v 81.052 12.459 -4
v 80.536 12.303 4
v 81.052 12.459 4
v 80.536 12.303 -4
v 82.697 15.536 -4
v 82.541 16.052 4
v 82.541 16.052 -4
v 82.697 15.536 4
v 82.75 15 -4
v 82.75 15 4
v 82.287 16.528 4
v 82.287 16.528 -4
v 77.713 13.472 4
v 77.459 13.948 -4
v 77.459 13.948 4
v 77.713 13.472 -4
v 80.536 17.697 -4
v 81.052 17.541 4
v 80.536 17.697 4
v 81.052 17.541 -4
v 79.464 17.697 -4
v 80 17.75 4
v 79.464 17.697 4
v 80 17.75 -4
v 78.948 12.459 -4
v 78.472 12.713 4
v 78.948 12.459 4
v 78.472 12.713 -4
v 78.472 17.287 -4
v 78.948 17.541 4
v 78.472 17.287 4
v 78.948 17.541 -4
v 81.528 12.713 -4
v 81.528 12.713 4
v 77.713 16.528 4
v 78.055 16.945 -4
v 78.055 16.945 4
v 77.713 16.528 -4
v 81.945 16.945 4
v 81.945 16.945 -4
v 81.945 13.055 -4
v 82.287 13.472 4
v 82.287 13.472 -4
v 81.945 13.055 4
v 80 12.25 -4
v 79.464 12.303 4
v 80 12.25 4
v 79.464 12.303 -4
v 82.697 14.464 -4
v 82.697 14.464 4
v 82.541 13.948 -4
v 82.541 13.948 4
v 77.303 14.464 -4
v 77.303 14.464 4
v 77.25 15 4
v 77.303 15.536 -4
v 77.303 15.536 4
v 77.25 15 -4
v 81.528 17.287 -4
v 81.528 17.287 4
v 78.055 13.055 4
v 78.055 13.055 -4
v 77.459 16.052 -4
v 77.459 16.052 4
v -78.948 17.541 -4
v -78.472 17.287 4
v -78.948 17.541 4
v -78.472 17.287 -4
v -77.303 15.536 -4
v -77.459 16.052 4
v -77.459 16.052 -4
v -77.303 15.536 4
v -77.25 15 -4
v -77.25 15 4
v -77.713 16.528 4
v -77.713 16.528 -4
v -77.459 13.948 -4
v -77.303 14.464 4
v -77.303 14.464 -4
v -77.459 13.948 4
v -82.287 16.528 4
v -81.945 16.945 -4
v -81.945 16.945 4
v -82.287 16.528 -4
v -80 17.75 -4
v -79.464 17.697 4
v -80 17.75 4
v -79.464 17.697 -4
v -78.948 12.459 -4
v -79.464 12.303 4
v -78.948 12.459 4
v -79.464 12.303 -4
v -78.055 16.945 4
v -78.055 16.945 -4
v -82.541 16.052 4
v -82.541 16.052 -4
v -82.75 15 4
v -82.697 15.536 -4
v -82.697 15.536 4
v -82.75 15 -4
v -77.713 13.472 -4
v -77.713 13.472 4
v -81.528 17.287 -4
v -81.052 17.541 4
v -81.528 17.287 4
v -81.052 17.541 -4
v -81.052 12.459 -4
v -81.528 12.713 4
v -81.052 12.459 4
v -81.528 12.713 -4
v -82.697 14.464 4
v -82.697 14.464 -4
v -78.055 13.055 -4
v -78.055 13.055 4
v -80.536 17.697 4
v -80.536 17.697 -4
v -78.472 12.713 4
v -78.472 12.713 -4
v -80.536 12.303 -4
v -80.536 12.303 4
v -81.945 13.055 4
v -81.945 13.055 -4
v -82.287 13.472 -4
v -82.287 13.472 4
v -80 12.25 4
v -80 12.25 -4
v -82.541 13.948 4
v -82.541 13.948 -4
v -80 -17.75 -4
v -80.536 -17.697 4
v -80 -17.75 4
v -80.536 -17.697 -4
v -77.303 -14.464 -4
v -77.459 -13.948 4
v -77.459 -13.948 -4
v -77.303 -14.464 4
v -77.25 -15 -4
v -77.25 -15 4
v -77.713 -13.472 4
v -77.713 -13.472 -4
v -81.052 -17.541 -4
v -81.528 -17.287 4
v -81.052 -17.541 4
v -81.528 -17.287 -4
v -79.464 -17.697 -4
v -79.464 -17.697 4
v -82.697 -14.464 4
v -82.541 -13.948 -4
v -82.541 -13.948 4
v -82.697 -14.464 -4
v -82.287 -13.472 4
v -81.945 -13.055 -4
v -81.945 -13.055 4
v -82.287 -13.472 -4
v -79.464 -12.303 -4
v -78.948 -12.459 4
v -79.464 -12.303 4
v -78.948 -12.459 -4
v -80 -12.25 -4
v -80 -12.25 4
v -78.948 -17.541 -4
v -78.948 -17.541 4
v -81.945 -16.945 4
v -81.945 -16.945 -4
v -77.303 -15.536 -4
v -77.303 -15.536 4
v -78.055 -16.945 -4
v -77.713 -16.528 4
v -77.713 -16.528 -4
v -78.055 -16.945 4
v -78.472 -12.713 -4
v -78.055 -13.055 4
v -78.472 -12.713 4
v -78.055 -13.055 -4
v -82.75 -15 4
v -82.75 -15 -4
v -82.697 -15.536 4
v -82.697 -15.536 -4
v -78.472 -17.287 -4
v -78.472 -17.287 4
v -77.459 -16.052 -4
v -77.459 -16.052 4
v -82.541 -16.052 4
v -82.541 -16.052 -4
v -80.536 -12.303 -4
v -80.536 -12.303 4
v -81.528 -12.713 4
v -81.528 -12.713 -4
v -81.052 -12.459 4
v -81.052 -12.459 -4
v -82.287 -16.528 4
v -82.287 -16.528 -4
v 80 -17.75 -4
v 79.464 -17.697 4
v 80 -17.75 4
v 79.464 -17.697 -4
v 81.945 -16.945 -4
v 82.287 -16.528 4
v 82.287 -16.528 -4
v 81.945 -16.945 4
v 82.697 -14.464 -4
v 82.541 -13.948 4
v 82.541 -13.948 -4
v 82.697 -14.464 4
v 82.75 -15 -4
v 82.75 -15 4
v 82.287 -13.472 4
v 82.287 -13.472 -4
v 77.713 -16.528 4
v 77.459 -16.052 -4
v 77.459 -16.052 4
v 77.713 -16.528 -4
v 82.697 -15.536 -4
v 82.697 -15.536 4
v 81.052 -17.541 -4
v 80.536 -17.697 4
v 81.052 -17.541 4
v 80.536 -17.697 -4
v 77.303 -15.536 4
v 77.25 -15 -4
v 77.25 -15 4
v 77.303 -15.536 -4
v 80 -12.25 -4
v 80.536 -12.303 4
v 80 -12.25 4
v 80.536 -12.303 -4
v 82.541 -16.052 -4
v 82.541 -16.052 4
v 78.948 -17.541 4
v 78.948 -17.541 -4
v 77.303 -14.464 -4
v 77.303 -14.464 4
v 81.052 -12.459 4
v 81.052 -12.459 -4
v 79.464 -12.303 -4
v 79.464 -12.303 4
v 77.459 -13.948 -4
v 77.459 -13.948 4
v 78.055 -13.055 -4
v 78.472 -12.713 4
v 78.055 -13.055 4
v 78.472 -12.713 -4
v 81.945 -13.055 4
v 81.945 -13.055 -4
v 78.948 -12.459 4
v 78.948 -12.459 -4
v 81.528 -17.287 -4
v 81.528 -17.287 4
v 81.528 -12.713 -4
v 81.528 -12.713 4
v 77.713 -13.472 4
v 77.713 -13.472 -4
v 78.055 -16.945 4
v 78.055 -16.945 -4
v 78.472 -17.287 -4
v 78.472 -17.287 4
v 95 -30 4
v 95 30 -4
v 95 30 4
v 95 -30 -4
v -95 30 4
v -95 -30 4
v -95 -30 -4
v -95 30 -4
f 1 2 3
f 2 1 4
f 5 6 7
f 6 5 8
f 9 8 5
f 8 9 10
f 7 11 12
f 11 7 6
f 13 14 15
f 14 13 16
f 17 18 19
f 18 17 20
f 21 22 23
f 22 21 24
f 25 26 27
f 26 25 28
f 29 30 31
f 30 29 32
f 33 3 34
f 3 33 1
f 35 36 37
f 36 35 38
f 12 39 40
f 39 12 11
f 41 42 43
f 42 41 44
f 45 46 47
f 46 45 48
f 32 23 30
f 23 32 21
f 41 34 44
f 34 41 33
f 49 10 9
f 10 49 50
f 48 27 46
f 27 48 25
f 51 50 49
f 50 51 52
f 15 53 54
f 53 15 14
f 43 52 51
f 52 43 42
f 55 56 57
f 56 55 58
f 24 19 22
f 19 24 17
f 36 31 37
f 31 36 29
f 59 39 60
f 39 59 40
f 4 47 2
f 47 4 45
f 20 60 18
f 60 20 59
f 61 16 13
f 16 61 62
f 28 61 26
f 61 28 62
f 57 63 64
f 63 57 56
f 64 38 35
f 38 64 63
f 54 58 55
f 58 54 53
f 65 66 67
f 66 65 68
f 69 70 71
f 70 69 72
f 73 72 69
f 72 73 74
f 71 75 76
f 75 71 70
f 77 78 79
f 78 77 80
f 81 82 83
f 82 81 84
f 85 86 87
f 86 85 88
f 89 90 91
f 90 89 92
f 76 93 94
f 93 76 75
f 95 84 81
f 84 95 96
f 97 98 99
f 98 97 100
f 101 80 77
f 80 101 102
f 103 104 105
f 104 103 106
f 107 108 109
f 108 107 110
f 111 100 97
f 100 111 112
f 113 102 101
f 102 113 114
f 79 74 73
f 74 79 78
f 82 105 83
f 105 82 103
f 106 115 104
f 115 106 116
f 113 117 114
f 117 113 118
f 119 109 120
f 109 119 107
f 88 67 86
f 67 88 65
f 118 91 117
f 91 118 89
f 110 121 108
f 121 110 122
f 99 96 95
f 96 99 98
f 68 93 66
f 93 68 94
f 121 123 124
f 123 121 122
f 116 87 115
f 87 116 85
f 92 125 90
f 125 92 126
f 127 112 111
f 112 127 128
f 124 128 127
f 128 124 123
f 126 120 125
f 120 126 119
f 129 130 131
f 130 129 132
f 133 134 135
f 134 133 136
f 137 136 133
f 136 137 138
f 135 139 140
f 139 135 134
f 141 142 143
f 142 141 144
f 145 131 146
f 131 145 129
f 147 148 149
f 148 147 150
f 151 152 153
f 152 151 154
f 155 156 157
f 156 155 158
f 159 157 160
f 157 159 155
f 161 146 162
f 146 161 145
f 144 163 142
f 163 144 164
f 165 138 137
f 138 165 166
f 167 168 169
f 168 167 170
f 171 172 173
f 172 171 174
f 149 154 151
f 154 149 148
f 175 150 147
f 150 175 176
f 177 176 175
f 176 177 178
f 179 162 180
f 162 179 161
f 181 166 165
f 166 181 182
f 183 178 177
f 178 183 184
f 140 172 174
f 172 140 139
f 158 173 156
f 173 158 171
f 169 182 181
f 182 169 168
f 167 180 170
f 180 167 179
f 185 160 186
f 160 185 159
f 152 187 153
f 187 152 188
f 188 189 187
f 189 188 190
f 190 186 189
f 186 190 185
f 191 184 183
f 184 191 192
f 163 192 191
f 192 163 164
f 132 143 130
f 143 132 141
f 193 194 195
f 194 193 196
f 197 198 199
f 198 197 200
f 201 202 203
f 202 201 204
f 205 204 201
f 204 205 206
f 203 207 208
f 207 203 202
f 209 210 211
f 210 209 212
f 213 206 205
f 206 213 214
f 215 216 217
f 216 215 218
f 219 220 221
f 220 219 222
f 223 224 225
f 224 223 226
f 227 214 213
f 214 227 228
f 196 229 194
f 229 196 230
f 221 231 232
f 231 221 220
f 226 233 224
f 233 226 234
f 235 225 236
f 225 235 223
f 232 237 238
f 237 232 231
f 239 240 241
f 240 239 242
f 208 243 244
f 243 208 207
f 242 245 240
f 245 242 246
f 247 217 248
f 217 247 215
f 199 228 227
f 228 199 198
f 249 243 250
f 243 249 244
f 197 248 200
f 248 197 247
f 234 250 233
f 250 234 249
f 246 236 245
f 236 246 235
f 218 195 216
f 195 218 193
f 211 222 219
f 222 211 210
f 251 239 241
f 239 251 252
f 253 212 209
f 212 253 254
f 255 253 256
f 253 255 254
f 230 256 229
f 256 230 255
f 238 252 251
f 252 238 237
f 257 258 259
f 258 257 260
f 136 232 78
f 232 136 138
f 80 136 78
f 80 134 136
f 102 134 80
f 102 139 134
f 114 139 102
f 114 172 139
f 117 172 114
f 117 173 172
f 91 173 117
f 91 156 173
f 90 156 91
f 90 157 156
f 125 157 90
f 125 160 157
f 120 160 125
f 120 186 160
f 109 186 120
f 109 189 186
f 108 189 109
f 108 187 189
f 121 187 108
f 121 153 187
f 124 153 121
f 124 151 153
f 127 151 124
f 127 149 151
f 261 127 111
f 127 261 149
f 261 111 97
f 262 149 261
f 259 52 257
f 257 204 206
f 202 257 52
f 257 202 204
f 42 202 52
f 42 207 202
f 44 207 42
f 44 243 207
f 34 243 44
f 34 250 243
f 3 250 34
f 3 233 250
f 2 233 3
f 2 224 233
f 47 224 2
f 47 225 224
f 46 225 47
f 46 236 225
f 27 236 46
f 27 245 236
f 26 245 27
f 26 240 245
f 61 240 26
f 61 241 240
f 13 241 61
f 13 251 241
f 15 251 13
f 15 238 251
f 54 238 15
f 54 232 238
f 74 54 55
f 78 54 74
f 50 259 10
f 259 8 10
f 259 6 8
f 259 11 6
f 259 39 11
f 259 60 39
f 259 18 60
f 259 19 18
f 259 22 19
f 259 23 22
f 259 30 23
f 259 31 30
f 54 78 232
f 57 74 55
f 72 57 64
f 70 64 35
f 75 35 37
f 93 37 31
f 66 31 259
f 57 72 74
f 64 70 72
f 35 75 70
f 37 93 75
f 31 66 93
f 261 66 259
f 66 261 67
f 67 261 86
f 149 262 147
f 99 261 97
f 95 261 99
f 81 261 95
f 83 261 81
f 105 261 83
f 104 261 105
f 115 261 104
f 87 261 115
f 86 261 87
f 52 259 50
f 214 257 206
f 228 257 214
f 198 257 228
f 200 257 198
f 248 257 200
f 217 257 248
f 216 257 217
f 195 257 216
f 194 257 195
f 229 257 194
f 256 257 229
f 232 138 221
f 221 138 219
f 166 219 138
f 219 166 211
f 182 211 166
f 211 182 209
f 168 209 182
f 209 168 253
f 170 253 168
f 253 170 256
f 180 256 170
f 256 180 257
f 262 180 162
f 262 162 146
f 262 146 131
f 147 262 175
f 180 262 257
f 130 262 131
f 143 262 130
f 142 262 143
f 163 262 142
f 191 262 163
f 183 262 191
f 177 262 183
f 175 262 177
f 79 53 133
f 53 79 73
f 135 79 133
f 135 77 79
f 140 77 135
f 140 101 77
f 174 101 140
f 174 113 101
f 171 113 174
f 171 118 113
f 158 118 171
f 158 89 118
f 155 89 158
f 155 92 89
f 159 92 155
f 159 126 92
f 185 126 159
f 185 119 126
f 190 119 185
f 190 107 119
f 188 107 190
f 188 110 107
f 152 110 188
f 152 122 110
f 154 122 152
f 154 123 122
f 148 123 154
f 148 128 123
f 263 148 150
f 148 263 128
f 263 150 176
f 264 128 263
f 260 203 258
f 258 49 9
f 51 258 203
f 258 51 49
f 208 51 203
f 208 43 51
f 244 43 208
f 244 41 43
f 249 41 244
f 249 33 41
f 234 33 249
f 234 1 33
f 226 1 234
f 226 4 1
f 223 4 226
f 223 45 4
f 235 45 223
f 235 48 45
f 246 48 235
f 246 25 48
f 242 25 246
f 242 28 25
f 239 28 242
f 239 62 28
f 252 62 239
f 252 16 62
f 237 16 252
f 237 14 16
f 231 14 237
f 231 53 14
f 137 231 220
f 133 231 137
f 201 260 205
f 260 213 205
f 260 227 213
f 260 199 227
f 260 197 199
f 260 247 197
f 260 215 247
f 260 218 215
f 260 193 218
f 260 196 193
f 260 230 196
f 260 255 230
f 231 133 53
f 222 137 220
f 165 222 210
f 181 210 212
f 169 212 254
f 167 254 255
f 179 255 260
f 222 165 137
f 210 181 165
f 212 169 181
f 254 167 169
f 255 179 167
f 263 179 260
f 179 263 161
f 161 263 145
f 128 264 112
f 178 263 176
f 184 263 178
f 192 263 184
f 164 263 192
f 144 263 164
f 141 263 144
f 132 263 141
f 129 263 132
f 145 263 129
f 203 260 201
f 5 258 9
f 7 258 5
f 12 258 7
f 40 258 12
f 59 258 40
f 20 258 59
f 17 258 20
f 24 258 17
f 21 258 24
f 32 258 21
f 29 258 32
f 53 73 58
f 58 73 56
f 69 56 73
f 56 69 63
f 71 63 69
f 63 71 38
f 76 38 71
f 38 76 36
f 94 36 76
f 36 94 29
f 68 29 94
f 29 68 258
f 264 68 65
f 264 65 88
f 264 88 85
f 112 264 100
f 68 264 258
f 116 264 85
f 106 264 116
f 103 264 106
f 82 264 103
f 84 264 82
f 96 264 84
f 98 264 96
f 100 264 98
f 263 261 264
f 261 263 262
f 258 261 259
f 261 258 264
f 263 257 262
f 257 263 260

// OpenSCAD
$fn = 32;

// ----------------------------------------------------------------------
// Corner plate 190 x 60 x 8
// 4 holes, centres taken from the edge offset
// ----------------------------------------------------------------------

// --- parameters (mm) ---
plate = [190, 60, 8];  // overall size (x, y, z)
holes = 4;             // number of holes the drawing asks for
hole_d = 5.5;          // hole diameter
edge = 15;             // hole centre offset from the plate edge

// --- derived feature positions (mm) ---
corner_x = plate[0] / 2 - edge;  // = 80   corner hole X
corner_y = plate[1] / 2 - edge;  // = 15   corner hole Y
feature_centers = [
  [corner_x, corner_y],
  [-corner_x, corner_y],
  [-corner_x, -corner_y],
  [corner_x, -corner_y]
];   // hole centres the loop below drills

// plate outline, every hole drilled through with the same cutters
difference() {
  cube(plate, center = true);
  for (centre = feature_centers)
    translate([centre[0], centre[1], 0])
      cylinder(d = hole_d, h = plate[2] + 2, center = true);
}
